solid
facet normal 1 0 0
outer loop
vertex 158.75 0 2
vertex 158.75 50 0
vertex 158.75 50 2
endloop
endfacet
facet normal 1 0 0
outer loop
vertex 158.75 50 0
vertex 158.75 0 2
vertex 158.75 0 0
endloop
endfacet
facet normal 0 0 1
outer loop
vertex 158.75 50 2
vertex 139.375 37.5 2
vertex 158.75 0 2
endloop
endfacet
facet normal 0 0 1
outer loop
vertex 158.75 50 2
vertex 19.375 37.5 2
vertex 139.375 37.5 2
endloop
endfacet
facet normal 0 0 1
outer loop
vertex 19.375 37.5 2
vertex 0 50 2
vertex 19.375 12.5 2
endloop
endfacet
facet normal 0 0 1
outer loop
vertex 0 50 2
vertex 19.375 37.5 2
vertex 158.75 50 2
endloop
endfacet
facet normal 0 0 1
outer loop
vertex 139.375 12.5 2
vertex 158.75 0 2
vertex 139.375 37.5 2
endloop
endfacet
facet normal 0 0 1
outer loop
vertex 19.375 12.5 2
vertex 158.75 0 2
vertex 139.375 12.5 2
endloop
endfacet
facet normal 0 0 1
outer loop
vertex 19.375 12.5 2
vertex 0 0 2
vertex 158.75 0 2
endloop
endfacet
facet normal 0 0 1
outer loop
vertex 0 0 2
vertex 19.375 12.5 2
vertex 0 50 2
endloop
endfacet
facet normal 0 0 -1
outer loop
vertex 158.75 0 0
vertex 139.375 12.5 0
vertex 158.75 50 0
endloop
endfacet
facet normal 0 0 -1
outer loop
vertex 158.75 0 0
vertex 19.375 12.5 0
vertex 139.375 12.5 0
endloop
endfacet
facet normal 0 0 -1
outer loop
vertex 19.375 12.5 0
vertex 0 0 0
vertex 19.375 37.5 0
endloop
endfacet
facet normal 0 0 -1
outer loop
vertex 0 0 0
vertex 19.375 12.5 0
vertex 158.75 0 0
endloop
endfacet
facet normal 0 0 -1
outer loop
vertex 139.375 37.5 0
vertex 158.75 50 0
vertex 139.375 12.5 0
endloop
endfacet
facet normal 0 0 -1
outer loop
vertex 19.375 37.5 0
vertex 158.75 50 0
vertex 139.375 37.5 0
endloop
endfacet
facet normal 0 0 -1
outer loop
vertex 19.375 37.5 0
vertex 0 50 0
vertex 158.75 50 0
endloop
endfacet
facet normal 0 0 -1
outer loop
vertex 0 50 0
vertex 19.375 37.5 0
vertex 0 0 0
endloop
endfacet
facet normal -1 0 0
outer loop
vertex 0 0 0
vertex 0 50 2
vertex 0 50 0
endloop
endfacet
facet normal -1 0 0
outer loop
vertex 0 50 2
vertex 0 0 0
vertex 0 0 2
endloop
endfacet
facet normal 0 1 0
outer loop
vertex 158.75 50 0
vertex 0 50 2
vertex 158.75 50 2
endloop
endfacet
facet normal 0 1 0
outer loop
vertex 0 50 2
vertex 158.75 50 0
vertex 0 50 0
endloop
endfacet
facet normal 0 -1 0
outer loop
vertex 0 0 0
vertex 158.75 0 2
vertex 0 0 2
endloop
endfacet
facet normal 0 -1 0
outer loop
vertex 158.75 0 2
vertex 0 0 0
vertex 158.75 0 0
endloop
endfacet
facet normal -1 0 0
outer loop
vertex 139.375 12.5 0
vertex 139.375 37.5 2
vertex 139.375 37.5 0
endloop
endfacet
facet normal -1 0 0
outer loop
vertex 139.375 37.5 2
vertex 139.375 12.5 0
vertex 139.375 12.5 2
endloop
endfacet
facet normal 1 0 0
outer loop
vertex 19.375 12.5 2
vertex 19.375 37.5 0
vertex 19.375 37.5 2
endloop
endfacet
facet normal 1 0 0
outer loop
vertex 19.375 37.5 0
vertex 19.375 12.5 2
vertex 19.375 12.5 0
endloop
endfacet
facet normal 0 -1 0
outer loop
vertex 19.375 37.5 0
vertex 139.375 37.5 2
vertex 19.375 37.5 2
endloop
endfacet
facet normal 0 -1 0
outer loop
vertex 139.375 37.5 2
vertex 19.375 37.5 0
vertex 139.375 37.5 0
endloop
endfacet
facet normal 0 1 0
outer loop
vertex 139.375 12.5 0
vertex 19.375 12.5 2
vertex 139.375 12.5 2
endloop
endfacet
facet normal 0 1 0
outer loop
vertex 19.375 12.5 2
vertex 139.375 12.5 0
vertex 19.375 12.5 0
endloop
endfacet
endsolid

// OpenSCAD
w = 158.75;
h = 50;

difference() {
    cube([w,h,2]);
    translate([(w-120)/2,(h-25)/2,-2])
        cube([120,25,5]);
}
